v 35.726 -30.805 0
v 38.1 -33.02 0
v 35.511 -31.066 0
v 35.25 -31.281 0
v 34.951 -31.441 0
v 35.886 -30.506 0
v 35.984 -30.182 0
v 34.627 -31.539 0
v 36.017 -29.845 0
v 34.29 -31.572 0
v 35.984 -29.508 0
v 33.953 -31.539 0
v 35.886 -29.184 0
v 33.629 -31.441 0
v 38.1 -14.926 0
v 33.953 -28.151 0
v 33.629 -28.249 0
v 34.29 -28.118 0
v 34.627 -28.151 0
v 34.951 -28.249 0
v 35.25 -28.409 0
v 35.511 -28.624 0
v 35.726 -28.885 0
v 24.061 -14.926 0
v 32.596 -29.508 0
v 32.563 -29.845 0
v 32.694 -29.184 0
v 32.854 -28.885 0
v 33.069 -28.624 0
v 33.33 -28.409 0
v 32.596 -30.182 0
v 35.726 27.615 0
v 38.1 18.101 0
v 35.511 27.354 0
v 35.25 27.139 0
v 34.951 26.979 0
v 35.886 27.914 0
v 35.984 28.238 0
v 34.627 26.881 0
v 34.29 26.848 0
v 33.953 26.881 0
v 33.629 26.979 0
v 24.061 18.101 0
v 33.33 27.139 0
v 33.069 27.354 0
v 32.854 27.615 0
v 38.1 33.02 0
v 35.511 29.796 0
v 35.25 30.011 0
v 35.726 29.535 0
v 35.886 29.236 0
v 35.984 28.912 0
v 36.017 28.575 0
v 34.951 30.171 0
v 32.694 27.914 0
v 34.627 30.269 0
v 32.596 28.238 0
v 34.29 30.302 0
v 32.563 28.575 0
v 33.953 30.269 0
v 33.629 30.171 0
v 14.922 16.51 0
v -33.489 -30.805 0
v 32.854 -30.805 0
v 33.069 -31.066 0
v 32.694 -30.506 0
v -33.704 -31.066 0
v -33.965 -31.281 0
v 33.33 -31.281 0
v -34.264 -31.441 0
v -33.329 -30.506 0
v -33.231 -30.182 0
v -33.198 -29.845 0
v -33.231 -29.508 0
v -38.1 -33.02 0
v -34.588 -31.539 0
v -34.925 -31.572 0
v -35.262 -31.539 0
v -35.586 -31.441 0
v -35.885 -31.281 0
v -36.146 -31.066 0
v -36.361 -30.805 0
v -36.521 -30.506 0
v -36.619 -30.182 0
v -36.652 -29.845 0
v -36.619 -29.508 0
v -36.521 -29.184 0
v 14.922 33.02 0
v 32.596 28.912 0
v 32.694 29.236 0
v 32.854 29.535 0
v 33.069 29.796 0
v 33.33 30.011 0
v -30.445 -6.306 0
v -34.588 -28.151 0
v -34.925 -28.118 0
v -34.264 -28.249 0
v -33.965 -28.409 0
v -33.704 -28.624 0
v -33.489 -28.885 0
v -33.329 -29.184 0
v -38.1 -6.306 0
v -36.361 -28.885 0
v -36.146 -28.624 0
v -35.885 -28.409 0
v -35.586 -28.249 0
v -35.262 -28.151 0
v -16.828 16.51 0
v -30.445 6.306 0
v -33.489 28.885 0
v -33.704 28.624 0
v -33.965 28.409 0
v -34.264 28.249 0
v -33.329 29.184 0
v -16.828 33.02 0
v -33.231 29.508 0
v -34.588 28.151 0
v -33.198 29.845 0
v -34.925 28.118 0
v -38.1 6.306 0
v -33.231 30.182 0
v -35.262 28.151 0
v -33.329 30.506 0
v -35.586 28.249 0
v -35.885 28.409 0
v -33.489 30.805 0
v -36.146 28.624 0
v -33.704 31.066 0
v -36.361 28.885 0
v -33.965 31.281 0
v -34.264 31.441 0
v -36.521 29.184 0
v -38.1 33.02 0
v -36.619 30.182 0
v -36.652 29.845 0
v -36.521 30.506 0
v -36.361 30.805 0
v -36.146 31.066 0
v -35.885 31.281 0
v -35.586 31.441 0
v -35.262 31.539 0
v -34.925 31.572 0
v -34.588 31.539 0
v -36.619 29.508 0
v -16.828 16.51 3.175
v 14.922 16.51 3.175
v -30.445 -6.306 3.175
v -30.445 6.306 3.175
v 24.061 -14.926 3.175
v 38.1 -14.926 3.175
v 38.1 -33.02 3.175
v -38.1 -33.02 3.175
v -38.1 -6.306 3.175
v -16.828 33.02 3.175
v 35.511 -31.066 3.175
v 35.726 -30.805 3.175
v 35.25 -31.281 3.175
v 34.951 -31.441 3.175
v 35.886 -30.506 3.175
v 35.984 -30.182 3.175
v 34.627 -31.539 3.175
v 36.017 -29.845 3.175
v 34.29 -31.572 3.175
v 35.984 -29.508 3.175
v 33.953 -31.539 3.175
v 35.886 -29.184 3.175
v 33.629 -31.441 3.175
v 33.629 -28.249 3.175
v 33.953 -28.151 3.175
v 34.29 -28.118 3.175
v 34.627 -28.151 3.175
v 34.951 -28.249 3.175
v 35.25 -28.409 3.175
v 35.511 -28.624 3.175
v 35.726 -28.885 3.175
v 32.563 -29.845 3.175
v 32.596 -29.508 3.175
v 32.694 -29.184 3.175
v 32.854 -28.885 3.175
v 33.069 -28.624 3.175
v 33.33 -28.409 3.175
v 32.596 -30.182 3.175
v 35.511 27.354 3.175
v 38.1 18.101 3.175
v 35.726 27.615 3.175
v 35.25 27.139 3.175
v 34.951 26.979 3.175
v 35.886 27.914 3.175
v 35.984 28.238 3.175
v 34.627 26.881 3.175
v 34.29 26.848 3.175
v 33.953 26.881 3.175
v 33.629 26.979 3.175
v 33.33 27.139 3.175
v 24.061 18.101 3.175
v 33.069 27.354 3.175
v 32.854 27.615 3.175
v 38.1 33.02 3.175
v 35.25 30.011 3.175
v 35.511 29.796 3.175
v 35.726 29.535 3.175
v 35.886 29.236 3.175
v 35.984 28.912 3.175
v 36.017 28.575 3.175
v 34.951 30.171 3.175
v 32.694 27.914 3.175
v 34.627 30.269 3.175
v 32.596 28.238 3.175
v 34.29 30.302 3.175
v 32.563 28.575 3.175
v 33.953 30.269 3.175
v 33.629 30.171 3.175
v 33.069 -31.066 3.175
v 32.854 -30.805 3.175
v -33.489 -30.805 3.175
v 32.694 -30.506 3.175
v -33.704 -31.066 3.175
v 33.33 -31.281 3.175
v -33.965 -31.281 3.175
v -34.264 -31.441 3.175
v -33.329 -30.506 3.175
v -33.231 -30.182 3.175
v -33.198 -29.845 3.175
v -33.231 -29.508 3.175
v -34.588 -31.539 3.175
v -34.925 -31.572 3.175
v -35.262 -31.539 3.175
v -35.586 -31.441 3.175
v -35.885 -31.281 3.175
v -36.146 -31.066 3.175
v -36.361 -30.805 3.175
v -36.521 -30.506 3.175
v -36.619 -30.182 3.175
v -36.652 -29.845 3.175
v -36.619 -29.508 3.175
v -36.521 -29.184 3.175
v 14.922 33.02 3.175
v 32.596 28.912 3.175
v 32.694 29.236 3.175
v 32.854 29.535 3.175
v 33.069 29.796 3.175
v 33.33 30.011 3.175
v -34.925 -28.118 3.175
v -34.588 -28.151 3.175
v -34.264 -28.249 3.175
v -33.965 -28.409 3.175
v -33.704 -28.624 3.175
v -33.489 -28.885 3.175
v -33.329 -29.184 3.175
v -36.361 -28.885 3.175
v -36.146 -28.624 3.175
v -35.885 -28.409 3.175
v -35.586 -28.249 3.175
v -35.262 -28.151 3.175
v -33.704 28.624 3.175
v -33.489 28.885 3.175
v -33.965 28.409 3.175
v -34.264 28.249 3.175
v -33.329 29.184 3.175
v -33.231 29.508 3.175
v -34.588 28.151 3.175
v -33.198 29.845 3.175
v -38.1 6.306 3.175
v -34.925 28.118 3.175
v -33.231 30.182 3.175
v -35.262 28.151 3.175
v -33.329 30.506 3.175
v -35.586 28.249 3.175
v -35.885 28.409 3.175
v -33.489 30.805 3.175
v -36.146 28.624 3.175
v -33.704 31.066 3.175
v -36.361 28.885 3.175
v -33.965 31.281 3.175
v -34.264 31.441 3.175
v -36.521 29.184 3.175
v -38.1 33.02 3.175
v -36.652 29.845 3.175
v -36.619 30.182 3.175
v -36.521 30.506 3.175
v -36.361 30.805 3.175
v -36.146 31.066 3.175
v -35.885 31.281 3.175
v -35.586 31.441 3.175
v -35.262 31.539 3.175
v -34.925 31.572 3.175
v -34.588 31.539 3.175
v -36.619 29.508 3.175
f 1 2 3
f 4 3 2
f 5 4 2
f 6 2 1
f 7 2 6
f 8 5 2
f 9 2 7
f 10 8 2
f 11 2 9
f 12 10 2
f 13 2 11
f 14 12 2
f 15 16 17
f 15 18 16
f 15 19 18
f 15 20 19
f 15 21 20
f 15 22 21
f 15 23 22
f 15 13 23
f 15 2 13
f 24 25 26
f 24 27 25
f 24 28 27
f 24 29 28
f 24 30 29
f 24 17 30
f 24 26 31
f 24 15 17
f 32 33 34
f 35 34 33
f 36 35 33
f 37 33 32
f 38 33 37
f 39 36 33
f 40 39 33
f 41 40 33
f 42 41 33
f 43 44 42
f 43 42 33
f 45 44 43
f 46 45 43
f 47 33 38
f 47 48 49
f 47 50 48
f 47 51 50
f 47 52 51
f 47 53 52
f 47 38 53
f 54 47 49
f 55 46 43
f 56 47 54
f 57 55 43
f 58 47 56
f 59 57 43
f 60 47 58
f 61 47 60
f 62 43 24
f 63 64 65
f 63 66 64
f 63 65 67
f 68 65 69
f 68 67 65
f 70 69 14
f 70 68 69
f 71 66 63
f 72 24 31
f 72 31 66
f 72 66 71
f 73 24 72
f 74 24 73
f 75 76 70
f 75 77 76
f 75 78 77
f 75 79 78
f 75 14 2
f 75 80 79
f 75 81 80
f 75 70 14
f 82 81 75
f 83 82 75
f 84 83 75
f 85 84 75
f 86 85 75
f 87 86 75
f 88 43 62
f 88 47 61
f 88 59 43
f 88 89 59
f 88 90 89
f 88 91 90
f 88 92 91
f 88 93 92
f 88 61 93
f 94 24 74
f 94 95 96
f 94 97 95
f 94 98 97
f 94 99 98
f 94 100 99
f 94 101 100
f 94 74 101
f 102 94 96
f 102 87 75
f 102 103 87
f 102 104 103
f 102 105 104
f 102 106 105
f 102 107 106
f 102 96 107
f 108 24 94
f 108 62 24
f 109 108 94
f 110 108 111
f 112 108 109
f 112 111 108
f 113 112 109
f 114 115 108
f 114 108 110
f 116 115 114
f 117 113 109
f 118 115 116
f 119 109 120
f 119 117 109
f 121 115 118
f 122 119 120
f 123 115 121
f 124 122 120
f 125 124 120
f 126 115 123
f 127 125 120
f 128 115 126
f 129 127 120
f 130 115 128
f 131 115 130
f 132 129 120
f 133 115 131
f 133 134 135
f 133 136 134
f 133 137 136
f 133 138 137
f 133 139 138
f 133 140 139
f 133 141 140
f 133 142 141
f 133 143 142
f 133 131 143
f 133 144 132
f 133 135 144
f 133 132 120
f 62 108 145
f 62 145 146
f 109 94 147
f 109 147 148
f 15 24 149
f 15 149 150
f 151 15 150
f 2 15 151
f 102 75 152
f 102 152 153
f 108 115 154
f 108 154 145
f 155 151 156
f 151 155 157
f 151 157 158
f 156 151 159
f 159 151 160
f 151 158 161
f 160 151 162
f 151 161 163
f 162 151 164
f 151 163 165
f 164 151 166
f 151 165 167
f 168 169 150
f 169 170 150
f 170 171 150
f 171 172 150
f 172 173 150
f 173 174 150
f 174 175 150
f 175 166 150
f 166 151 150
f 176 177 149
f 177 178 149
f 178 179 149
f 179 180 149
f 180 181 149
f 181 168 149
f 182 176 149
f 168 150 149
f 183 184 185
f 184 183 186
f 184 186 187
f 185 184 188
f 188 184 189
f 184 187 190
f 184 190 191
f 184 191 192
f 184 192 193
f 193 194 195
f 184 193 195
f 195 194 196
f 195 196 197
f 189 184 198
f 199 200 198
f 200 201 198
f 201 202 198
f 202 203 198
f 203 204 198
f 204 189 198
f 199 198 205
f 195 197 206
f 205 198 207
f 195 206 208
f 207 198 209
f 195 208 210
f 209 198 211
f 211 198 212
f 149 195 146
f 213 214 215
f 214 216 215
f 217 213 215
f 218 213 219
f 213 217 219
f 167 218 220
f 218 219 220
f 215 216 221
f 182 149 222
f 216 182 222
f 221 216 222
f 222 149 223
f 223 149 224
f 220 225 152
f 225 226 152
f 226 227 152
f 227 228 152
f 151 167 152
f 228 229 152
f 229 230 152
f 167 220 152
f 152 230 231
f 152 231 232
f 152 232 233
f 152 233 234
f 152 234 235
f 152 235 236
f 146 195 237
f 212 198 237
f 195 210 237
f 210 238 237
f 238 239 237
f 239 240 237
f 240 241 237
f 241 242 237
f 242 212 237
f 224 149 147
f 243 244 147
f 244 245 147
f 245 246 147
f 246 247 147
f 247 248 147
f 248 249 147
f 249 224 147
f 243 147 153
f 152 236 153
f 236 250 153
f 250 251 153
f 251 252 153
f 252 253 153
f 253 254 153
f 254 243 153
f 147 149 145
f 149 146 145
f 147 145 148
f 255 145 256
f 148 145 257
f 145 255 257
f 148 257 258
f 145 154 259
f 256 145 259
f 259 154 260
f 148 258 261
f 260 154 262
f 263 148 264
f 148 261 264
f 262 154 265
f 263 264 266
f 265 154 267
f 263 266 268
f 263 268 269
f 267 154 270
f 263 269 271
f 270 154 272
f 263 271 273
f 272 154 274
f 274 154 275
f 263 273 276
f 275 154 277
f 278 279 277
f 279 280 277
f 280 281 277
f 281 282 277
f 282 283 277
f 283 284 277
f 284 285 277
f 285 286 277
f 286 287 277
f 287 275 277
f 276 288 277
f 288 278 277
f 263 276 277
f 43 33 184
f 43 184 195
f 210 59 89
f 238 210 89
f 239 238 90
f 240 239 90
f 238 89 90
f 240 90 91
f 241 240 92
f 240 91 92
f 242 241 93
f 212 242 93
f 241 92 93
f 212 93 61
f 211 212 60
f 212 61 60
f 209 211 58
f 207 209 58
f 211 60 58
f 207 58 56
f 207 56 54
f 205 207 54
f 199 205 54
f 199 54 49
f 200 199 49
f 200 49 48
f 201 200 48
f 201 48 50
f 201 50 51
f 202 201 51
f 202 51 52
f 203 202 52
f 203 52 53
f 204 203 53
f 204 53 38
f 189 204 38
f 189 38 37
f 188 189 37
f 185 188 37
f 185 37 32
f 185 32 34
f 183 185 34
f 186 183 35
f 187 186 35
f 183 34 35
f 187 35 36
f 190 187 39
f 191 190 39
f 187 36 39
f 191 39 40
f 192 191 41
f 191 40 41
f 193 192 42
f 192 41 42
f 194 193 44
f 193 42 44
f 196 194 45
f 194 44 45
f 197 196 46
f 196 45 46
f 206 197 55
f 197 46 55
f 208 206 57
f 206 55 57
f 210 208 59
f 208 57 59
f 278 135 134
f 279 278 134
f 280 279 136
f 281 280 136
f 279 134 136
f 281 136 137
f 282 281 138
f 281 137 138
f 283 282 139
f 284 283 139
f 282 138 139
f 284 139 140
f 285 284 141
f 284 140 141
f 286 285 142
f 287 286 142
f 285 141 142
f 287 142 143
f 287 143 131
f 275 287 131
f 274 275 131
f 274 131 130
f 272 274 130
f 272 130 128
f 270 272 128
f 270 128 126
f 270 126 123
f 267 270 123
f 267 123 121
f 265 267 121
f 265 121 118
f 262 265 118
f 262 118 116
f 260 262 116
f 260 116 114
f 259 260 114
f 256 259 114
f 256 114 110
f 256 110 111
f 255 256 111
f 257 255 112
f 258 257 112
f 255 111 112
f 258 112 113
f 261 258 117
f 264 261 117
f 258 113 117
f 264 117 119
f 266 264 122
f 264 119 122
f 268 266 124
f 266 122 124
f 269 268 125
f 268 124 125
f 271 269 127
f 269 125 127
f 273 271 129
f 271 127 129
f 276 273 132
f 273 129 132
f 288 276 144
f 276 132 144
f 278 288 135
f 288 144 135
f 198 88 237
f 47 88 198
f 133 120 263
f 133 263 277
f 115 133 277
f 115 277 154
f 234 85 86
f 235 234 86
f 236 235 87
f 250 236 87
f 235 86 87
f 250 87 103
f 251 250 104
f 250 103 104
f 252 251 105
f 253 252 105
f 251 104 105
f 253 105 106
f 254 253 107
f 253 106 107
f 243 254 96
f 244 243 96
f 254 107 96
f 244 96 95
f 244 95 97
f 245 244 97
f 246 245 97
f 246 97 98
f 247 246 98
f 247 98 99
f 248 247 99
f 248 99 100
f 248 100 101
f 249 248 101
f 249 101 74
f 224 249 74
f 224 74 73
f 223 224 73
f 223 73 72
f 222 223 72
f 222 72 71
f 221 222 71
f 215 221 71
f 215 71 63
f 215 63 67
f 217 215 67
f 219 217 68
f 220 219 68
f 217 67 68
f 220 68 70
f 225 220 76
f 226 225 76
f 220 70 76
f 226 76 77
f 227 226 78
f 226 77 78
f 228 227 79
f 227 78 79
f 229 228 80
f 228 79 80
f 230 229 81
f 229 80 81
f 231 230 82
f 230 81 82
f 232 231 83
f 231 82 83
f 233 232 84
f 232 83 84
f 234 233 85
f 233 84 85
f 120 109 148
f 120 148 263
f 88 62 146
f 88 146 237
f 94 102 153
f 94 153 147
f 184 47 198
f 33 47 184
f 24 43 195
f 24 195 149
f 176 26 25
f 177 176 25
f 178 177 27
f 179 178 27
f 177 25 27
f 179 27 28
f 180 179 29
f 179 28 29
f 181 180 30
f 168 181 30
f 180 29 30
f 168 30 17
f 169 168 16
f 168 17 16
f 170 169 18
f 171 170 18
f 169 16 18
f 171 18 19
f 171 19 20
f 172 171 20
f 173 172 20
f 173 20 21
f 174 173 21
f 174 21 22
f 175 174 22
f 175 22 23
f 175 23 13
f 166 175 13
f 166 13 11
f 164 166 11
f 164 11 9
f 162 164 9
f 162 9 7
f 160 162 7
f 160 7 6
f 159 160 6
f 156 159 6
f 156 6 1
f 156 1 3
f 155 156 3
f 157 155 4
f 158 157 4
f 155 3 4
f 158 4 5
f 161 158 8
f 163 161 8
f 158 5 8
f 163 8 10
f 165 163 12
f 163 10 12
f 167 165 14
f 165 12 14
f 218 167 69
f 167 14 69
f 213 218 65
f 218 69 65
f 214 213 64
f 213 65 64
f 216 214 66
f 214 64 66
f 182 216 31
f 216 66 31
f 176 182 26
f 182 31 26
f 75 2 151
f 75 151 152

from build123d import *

# Parameters (mm, degrees)
BOSS_EXTRUDE1_DEPTH       = 3.175
F_4_CLEARANCE_HOLE1_D     = 3.4544
F_4_CLEARANCE_HOLE1_DEPTH = 10.16
F_4_CLEARANCE_HOLE1_TIP   = 1.037806461


with BuildPart() as part:
    # Sketch2 → Boss-Extrude1 (new body)
    with BuildSketch(Plane.XY):
        Polygon((-38.1, 33.02), (-16.8275, 33.02), (-16.8275, 16.51), (14.9225, 16.51), (14.9225, 33.02), (38.1, 33.02), (38.1, 18.1011502), (24.060772257, 18.1011502), (24.060772257, -14.926152342), (38.1, -14.926152342), (38.1, -33.02), (-38.1, -33.02), (-38.1, -6.305887107), (-30.445430268, -6.305887107), (-30.445430268, 6.305887107), (-38.1, 6.305887107), align=None)
    extrude(amount=BOSS_EXTRUDE1_DEPTH)

    # #4 Clearance Hole1
    with Locations(Plane.XY.offset(3.175)):
        with Locations((-34.925, 29.845), (34.29, 28.575), (-34.925, -29.845), (34.29, -29.845)):
            Hole(F_4_CLEARANCE_HOLE1_D / 2, depth=F_4_CLEARANCE_HOLE1_DEPTH)
            with Locations((0, 0, -(F_4_CLEARANCE_HOLE1_DEPTH + F_4_CLEARANCE_HOLE1_TIP / 2))):  # 118° drill point
                Cone(0, F_4_CLEARANCE_HOLE1_D / 2, F_4_CLEARANCE_HOLE1_TIP, mode=Mode.SUBTRACT)


solid = part.part
